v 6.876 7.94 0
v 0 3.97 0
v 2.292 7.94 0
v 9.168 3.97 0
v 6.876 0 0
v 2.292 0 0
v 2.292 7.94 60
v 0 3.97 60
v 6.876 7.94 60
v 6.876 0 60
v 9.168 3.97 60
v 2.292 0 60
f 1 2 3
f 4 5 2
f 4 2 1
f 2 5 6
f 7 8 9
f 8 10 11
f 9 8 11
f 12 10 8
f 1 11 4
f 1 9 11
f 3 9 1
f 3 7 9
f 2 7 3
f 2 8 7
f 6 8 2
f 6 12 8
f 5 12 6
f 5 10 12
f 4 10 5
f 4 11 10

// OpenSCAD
$fn = 32;

// ----------------------------------------------------------------------
// Key bar: hex key, 60 mm thick
// ----------------------------------------------------------------------

// --- parameters (mm) ---
profile_height = 60;      // extrusion height
profile_points = 6;       // points of the closed outline

profile = [[9.168, 3.97], [6.876, 7.94], [2.292, 7.94], [0, 3.97], [2.292, 0], [6.876, 0]];  // single closed polygon, 6 points, counter clockwise

// --- the one profile operation ---
linear_extrude(height = profile_height) polygon(points = profile);
